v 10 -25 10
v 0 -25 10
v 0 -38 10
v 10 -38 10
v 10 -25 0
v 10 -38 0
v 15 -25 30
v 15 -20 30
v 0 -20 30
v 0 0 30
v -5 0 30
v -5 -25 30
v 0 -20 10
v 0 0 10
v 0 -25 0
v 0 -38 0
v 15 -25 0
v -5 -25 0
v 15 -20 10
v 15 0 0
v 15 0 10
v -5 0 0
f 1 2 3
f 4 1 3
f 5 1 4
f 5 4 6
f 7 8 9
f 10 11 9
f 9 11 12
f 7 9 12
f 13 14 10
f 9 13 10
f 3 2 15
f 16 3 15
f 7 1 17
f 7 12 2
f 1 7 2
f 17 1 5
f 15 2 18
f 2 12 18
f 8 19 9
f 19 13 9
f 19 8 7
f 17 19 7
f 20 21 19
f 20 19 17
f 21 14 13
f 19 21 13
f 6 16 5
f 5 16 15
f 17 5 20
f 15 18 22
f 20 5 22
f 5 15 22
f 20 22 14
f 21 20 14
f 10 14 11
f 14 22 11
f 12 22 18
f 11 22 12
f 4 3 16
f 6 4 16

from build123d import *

# Parameters (mm, degrees)
BOSS_EXTRUDE1_DEPTH = 10
SKETCH2_W           = 30
SKETCH2_H           = 25
BOSS_EXTRUDE2_DEPTH = 5
BOSS_EXTRUDE3_DEPTH = 5


with BuildPart() as part:
    # Sketch1 → Boss-Extrude1 (new body)
    with BuildSketch(Plane(origin=(0, 0, 0), x_dir=(0, 0, -1), z_dir=(1, 0, 0))):
        Polygon((0, 0), (-10, 0), (-10, -20), (-30, -20), (-30, -25), (-10, -25), (-10, -38), (0, -38), align=None)
    extrude(amount=BOSS_EXTRUDE1_DEPTH)

    # Sketch2 → Boss-Extrude2 (add)
    with BuildSketch(Plane.ZY):
        with Locations((15, -12.5)):
            Rectangle(SKETCH2_W, SKETCH2_H)
    extrude(amount=BOSS_EXTRUDE2_DEPTH)

    # Sketch3 → Boss-Extrude3 (add)
    with BuildSketch(Plane(origin=(10, 0, 0), x_dir=(0, 0, -1), z_dir=(1, 0, 0))):
        Polygon((-10, 0), (-10, -20), (-30, -20), (-30, -25), (-10, -25), (0, -25), (0, 0), align=None)
    extrude(amount=BOSS_EXTRUDE3_DEPTH)


solid = part.part
